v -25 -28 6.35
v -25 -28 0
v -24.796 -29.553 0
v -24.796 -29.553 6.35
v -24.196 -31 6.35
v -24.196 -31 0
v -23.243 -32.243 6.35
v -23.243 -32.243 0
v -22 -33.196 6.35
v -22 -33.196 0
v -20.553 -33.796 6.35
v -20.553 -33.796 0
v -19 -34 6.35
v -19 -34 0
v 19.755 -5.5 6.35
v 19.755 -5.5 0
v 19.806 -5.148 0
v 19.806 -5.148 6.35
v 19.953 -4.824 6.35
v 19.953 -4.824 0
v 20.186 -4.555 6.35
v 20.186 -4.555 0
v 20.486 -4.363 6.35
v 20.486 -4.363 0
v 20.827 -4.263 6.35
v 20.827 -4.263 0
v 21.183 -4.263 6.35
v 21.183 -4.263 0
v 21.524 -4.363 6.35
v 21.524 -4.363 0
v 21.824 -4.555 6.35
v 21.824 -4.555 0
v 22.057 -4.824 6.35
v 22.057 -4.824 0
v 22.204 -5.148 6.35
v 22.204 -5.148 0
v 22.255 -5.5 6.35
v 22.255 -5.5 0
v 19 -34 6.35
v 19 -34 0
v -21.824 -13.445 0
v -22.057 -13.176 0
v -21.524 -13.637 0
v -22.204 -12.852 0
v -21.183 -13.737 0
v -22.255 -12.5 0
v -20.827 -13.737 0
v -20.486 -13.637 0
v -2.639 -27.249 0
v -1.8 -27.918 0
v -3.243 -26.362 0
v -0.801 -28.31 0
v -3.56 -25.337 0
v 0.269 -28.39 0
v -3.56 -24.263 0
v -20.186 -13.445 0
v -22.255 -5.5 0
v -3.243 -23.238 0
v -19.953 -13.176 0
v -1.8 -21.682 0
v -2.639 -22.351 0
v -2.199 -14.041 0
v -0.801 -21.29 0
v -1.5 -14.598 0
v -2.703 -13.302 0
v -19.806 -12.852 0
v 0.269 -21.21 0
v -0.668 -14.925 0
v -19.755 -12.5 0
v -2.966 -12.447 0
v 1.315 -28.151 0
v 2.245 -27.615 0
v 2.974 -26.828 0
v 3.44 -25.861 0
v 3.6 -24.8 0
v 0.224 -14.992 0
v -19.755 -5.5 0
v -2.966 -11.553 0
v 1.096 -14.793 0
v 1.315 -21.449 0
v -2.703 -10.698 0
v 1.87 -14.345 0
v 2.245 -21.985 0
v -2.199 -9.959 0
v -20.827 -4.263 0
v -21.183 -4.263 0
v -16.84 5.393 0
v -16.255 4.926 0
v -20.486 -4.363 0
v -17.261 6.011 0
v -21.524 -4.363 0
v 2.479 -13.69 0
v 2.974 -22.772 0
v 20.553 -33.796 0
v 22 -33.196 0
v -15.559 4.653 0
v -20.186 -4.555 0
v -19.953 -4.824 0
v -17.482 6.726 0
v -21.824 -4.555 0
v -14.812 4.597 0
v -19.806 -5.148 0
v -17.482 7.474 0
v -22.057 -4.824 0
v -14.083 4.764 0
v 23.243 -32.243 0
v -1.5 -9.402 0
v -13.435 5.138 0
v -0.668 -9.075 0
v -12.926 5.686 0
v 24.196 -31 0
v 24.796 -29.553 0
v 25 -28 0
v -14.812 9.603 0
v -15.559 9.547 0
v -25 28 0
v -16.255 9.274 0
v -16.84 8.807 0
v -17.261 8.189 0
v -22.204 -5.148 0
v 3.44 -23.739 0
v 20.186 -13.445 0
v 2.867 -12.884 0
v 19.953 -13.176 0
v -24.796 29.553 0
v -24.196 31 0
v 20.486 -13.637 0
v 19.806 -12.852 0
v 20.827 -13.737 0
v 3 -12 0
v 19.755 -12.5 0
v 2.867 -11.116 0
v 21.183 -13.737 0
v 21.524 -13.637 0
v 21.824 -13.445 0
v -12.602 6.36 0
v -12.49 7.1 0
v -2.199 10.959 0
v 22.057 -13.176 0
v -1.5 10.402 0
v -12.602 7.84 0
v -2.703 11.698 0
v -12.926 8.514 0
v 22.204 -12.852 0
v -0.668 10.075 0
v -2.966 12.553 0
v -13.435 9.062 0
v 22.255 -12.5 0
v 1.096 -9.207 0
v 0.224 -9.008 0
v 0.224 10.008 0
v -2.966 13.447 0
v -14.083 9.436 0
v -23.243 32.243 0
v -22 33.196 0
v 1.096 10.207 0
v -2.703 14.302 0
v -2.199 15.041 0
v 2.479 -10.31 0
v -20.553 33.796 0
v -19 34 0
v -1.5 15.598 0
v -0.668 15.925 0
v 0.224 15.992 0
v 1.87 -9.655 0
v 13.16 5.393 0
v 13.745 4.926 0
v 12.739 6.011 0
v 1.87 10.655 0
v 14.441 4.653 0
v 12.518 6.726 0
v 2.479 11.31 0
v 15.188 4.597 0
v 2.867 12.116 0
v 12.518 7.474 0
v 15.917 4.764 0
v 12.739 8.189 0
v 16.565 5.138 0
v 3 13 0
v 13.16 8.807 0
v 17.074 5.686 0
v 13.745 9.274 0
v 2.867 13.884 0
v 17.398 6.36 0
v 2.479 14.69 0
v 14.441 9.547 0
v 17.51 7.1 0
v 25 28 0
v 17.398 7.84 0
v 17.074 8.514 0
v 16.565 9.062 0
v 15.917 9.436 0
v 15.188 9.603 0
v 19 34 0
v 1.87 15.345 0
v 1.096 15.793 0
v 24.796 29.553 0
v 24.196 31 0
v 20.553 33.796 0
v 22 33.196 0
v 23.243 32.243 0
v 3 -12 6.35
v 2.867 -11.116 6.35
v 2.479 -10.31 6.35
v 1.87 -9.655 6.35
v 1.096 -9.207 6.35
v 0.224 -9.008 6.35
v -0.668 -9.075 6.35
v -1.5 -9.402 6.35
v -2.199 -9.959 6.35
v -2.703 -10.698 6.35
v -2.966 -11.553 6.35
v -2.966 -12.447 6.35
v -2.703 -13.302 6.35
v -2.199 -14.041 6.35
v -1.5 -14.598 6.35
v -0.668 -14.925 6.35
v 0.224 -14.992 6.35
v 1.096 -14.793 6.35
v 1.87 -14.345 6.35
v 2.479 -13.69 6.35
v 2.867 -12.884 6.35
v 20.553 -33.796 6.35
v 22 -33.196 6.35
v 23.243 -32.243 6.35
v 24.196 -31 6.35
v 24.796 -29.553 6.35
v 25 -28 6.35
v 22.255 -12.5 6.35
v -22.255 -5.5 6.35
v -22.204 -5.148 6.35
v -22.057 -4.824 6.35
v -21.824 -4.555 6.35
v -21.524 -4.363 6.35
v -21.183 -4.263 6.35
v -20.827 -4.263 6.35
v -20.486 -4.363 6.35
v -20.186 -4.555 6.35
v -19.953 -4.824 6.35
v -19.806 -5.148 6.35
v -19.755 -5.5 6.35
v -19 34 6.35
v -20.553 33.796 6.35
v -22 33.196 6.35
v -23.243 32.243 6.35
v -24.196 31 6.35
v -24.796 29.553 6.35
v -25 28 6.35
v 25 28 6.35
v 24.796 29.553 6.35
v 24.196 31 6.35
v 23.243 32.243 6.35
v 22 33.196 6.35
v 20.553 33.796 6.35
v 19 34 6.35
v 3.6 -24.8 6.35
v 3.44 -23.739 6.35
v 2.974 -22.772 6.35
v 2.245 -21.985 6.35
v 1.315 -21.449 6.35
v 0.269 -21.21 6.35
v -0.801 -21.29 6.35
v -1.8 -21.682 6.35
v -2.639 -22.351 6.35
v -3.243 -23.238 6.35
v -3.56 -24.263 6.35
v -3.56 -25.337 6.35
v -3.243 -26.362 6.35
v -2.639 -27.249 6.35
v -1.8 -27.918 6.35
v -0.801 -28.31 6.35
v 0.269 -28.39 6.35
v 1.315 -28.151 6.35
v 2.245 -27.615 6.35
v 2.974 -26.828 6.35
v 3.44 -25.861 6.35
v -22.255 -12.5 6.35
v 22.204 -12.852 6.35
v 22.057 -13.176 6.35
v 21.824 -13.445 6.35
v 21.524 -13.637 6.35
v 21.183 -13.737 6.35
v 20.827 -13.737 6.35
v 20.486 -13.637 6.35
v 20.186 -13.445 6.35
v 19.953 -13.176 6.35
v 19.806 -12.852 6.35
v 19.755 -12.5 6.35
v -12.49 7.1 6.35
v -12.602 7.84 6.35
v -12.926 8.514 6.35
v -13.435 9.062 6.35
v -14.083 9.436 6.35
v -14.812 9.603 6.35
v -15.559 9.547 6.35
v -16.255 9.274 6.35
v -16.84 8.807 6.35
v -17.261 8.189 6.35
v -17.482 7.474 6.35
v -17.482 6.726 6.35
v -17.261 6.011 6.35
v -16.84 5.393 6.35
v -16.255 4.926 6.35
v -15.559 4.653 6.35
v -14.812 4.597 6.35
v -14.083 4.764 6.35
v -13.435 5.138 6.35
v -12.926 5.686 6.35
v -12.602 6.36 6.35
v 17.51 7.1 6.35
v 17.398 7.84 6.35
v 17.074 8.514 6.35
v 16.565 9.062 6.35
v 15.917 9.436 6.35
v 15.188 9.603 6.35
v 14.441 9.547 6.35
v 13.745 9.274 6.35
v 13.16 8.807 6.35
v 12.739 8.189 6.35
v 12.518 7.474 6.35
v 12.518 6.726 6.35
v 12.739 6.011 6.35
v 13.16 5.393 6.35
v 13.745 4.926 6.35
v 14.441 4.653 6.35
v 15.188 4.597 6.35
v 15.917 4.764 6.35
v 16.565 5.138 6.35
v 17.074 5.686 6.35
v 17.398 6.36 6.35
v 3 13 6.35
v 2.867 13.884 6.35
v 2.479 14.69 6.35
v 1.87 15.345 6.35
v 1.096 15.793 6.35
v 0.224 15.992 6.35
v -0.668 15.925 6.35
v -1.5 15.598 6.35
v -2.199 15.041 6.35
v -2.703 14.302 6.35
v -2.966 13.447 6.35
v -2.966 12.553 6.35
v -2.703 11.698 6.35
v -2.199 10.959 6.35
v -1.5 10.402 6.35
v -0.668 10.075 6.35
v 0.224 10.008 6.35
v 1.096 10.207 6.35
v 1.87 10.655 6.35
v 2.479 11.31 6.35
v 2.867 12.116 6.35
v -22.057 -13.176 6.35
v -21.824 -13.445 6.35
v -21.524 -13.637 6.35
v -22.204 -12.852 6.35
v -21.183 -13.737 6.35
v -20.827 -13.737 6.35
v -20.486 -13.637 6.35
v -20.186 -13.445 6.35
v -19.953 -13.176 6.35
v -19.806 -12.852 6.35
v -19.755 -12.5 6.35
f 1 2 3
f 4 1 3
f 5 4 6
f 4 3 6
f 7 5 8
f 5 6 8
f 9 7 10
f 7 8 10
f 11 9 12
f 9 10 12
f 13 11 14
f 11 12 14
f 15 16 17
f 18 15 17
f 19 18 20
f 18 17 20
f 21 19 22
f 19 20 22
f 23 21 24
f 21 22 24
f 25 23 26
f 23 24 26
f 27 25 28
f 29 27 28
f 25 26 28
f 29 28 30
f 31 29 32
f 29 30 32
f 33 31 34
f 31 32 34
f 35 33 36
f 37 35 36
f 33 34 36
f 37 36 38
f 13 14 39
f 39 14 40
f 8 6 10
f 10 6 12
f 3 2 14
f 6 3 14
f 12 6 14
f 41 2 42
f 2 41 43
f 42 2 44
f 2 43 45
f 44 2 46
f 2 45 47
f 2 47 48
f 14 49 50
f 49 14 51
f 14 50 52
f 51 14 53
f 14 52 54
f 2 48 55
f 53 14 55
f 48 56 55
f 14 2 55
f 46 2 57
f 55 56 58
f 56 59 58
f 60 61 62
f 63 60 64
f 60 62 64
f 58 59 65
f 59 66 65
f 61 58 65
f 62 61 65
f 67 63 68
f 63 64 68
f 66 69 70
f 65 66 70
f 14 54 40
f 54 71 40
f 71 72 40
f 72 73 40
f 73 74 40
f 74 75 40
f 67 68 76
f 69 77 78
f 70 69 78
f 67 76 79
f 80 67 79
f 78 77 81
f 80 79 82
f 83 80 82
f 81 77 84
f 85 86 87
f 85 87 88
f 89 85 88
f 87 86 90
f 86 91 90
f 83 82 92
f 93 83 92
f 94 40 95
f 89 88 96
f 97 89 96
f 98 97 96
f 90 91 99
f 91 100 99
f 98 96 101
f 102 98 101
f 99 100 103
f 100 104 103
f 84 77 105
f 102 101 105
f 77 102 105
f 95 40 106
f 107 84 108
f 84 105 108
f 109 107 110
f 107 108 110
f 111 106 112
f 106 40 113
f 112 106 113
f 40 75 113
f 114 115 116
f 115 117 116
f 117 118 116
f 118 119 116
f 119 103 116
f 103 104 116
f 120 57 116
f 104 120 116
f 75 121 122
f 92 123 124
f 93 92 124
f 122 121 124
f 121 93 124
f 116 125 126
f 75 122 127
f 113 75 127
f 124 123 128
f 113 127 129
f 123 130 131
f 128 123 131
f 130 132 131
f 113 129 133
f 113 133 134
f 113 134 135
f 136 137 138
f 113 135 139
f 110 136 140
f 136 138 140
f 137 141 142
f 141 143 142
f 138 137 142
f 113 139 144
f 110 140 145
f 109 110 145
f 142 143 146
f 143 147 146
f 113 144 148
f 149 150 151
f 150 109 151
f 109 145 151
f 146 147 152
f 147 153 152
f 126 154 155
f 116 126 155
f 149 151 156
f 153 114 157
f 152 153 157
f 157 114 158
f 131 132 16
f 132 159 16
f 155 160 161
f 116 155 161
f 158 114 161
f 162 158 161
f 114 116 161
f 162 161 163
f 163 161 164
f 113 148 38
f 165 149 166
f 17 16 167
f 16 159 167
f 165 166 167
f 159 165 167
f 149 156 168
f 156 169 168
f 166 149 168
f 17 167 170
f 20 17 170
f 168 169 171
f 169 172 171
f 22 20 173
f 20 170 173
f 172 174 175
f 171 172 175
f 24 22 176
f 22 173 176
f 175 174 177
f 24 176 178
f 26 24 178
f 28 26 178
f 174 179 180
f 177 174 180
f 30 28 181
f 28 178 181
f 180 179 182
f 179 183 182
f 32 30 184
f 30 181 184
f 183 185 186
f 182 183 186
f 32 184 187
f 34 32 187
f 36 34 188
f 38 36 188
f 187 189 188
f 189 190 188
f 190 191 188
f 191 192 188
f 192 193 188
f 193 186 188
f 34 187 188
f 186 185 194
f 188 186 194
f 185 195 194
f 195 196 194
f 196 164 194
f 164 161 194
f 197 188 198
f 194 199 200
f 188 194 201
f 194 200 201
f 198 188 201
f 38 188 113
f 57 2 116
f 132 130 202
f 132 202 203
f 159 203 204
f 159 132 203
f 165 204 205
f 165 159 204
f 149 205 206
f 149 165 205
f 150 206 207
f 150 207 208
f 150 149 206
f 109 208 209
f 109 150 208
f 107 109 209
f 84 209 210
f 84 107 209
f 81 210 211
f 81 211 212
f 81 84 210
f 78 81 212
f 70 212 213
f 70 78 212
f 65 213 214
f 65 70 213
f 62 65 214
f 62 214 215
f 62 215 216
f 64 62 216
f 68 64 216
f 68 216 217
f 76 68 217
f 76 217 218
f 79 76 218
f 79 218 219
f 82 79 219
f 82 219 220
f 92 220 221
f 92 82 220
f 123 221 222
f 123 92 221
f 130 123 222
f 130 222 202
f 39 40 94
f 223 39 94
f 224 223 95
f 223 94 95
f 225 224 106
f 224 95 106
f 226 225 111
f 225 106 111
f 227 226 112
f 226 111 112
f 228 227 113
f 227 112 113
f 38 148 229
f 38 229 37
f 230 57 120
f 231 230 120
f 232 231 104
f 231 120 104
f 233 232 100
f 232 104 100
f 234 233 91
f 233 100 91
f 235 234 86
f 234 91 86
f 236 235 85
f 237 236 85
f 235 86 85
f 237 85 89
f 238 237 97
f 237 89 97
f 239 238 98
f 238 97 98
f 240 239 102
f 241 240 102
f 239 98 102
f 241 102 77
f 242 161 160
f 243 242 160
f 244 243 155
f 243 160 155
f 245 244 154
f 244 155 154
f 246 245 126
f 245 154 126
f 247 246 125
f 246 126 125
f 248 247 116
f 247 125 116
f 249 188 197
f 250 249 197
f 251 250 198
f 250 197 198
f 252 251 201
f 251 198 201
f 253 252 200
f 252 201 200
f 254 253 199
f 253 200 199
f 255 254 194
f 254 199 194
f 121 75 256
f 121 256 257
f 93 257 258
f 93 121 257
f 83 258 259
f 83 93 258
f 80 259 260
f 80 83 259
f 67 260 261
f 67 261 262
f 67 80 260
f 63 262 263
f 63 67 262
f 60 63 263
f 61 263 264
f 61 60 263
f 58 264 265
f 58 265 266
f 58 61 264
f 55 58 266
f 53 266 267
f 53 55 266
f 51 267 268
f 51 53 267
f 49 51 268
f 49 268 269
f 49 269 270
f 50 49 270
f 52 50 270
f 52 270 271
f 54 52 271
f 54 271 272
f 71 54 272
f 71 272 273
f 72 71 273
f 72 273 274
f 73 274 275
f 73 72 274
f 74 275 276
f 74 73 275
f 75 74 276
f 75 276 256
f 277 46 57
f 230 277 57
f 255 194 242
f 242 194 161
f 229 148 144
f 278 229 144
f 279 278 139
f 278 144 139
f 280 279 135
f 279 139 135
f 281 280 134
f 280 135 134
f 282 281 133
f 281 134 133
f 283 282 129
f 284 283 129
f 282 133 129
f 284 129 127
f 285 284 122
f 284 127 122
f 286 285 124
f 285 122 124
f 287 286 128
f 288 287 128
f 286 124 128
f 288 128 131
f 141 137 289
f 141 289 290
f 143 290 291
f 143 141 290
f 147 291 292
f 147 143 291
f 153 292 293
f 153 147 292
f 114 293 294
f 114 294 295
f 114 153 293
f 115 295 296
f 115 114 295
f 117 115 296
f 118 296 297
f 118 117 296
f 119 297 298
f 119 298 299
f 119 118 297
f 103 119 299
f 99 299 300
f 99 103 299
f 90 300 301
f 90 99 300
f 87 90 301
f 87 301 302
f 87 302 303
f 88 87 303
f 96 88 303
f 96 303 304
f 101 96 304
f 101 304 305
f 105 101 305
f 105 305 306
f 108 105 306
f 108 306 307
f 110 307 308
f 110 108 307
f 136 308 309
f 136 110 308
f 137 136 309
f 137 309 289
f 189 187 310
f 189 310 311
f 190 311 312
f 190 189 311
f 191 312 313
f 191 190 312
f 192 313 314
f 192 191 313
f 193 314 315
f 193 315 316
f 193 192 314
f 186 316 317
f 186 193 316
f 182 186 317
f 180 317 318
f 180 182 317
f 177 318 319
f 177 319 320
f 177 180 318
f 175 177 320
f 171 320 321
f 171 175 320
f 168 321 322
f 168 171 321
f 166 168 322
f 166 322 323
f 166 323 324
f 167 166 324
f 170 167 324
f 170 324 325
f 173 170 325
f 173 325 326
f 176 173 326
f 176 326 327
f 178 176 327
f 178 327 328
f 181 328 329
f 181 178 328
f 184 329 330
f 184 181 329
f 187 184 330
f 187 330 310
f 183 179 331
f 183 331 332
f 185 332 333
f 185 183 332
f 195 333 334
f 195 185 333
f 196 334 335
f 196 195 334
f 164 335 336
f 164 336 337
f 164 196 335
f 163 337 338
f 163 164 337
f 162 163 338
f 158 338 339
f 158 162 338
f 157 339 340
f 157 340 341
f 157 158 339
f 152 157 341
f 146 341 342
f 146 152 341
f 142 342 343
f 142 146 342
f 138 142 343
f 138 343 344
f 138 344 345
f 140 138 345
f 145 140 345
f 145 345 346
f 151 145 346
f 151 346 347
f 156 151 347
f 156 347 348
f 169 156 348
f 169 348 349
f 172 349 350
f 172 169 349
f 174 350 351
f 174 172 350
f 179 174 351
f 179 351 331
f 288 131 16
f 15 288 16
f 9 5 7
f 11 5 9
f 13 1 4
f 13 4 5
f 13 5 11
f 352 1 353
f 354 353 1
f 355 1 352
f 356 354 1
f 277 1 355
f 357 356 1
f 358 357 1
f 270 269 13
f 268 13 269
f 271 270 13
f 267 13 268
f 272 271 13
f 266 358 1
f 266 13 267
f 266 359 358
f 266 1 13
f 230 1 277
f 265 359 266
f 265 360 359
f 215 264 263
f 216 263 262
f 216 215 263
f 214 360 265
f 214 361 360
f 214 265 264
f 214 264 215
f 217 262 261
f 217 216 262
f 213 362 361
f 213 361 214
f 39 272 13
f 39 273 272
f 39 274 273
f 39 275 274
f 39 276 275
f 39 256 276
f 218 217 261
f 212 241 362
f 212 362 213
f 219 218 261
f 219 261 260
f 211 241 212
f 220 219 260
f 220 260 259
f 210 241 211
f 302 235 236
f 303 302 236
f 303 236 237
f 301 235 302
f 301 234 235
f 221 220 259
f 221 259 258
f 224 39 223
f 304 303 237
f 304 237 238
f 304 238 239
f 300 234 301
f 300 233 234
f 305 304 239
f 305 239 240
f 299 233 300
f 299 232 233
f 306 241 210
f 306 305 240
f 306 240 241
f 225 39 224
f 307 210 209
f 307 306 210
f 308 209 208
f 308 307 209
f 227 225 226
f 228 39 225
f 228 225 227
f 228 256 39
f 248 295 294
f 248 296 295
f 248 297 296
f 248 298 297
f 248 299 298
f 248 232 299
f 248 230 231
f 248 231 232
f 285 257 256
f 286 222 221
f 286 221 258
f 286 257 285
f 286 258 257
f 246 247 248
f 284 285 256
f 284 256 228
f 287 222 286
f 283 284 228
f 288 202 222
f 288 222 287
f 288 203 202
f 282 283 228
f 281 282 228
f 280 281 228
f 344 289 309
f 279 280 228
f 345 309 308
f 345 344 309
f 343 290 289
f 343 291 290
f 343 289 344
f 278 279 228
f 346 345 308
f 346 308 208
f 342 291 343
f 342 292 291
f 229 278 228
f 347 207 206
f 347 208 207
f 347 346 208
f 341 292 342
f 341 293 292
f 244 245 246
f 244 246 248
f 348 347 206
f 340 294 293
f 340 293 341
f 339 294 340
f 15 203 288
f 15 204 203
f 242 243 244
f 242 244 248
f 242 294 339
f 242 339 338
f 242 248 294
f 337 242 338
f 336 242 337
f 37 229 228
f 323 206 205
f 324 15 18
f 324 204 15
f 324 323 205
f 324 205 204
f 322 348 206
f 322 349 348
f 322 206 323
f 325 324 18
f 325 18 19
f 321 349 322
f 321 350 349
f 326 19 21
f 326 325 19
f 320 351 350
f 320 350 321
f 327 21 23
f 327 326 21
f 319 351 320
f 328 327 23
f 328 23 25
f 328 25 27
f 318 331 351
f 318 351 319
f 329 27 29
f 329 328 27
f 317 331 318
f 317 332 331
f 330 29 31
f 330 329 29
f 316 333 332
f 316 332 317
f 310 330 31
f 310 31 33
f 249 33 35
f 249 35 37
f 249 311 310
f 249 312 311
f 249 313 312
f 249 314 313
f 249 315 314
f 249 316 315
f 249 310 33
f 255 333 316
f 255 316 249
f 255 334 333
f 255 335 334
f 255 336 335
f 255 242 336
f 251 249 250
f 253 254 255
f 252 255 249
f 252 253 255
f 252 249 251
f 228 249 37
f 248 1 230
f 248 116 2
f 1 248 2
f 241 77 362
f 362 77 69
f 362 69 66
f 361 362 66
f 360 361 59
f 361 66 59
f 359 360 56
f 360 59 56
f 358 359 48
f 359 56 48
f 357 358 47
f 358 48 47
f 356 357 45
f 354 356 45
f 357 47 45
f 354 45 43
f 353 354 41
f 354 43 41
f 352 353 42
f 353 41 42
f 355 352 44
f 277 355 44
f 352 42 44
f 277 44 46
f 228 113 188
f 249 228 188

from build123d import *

# Parameters (mm, degrees)
F0_W     = 19.2
F0_H     = 68
F0_R     = 6
F0_R_2   = 3
F0_R_3   = 4.75
F0_R_4   = 3.6
F0_R_5   = 2.51
F0_W_2   = 2.745
F0_H_2   = 7
F1_DEPTH = 6.35


with BuildPart() as f1:
    # F0 (on Top) → F1 (new body)
    with BuildSketch(Plane.XY):
        Rectangle(F0_W, F0_H)
        with Locations((0, -24.8)):
            Circle(F0_R, mode=Mode.SUBTRACT)
        with Locations((0, -12)):
            Circle(F0_R_2, mode=Mode.SUBTRACT)
        with Locations((0, 13)):
            Circle(F0_R_2, mode=Mode.SUBTRACT)
        with BuildLine():
            Line((-25, -5.5), (-22.255, -5.5))
            ThreePointArc((-22.255, -5.5), (-21.005, -4.25), (-19.755, -5.5))
            Line((-19.755, -5.5), (-19.755, -12.5))
            ThreePointArc((-19.755, -12.5), (-21.005, -13.75), (-22.255, -12.5))
            Line((-22.255, -12.5), (-25, -12.5))
            Line((-25, -12.5), (-25, -28))
            ThreePointArc((-25, -28), (-23.242641, -32.242641), (-19, -34))
            Line((-19, -34), (-10, -34))
            Line((-10, -34), (-9.6, -34))
            Line((-9.6, -34), (-9.6, 34))
            Line((-9.6, 34), (-19, 34))
            ThreePointArc((-19, 34), (-23.242641, 32.242641), (-25, 28))
            Line((-25, 28), (-25, -5.5))
        make_face()
        with Locations((-15, 7.1)):
            Circle(F0_R_3, mode=Mode.SUBTRACT)
        with BuildLine():
            Line((19, 34), (9.6, 34))
            Line((9.6, 34), (9.6, -34))
            Line((9.6, -34), (19, -34))
            ThreePointArc((19, -34), (23.242641, -32.242641), (25, -28))
            Line((25, -28), (25, -12.5))
            Line((25, -12.5), (22.255, -12.5))
            ThreePointArc((22.255, -12.5), (21.005, -13.75), (19.755, -12.5))
            Line((19.755, -12.5), (19.755, -5.5))
            ThreePointArc((19.755, -5.5), (21.005, -4.25), (22.255, -5.5))
            Line((22.255, -5.5), (25, -5.5))
            Line((25, -5.5), (25, 28))
            ThreePointArc((25, 28), (23.242641, 32.242641), (19, 34))
        make_face()
        with Locations((15, 7.1)):
            Circle(F0_R_3, mode=Mode.SUBTRACT)
        with Locations((0, -24.8)):
            Circle(F0_R)
        with Locations((0, -24.8)):
            Circle(F0_R_4, mode=Mode.SUBTRACT)
        with Locations((15, 7.1)):
            Circle(F0_R_3)
        with Locations((15, 7.1)):
            Circle(F0_R_5, mode=Mode.SUBTRACT)
        with Locations((-15, 7.1)):
            Circle(F0_R_3)
        with Locations((-15, 7.1)):
            Circle(F0_R_5, mode=Mode.SUBTRACT)
        with Locations((-23.6275, -9)):
            Rectangle(F0_W_2, F0_H_2)
        with Locations((23.6275, -9)):
            Rectangle(F0_W_2, F0_H_2)
    extrude(amount=F1_DEPTH)


solid = f1.part
